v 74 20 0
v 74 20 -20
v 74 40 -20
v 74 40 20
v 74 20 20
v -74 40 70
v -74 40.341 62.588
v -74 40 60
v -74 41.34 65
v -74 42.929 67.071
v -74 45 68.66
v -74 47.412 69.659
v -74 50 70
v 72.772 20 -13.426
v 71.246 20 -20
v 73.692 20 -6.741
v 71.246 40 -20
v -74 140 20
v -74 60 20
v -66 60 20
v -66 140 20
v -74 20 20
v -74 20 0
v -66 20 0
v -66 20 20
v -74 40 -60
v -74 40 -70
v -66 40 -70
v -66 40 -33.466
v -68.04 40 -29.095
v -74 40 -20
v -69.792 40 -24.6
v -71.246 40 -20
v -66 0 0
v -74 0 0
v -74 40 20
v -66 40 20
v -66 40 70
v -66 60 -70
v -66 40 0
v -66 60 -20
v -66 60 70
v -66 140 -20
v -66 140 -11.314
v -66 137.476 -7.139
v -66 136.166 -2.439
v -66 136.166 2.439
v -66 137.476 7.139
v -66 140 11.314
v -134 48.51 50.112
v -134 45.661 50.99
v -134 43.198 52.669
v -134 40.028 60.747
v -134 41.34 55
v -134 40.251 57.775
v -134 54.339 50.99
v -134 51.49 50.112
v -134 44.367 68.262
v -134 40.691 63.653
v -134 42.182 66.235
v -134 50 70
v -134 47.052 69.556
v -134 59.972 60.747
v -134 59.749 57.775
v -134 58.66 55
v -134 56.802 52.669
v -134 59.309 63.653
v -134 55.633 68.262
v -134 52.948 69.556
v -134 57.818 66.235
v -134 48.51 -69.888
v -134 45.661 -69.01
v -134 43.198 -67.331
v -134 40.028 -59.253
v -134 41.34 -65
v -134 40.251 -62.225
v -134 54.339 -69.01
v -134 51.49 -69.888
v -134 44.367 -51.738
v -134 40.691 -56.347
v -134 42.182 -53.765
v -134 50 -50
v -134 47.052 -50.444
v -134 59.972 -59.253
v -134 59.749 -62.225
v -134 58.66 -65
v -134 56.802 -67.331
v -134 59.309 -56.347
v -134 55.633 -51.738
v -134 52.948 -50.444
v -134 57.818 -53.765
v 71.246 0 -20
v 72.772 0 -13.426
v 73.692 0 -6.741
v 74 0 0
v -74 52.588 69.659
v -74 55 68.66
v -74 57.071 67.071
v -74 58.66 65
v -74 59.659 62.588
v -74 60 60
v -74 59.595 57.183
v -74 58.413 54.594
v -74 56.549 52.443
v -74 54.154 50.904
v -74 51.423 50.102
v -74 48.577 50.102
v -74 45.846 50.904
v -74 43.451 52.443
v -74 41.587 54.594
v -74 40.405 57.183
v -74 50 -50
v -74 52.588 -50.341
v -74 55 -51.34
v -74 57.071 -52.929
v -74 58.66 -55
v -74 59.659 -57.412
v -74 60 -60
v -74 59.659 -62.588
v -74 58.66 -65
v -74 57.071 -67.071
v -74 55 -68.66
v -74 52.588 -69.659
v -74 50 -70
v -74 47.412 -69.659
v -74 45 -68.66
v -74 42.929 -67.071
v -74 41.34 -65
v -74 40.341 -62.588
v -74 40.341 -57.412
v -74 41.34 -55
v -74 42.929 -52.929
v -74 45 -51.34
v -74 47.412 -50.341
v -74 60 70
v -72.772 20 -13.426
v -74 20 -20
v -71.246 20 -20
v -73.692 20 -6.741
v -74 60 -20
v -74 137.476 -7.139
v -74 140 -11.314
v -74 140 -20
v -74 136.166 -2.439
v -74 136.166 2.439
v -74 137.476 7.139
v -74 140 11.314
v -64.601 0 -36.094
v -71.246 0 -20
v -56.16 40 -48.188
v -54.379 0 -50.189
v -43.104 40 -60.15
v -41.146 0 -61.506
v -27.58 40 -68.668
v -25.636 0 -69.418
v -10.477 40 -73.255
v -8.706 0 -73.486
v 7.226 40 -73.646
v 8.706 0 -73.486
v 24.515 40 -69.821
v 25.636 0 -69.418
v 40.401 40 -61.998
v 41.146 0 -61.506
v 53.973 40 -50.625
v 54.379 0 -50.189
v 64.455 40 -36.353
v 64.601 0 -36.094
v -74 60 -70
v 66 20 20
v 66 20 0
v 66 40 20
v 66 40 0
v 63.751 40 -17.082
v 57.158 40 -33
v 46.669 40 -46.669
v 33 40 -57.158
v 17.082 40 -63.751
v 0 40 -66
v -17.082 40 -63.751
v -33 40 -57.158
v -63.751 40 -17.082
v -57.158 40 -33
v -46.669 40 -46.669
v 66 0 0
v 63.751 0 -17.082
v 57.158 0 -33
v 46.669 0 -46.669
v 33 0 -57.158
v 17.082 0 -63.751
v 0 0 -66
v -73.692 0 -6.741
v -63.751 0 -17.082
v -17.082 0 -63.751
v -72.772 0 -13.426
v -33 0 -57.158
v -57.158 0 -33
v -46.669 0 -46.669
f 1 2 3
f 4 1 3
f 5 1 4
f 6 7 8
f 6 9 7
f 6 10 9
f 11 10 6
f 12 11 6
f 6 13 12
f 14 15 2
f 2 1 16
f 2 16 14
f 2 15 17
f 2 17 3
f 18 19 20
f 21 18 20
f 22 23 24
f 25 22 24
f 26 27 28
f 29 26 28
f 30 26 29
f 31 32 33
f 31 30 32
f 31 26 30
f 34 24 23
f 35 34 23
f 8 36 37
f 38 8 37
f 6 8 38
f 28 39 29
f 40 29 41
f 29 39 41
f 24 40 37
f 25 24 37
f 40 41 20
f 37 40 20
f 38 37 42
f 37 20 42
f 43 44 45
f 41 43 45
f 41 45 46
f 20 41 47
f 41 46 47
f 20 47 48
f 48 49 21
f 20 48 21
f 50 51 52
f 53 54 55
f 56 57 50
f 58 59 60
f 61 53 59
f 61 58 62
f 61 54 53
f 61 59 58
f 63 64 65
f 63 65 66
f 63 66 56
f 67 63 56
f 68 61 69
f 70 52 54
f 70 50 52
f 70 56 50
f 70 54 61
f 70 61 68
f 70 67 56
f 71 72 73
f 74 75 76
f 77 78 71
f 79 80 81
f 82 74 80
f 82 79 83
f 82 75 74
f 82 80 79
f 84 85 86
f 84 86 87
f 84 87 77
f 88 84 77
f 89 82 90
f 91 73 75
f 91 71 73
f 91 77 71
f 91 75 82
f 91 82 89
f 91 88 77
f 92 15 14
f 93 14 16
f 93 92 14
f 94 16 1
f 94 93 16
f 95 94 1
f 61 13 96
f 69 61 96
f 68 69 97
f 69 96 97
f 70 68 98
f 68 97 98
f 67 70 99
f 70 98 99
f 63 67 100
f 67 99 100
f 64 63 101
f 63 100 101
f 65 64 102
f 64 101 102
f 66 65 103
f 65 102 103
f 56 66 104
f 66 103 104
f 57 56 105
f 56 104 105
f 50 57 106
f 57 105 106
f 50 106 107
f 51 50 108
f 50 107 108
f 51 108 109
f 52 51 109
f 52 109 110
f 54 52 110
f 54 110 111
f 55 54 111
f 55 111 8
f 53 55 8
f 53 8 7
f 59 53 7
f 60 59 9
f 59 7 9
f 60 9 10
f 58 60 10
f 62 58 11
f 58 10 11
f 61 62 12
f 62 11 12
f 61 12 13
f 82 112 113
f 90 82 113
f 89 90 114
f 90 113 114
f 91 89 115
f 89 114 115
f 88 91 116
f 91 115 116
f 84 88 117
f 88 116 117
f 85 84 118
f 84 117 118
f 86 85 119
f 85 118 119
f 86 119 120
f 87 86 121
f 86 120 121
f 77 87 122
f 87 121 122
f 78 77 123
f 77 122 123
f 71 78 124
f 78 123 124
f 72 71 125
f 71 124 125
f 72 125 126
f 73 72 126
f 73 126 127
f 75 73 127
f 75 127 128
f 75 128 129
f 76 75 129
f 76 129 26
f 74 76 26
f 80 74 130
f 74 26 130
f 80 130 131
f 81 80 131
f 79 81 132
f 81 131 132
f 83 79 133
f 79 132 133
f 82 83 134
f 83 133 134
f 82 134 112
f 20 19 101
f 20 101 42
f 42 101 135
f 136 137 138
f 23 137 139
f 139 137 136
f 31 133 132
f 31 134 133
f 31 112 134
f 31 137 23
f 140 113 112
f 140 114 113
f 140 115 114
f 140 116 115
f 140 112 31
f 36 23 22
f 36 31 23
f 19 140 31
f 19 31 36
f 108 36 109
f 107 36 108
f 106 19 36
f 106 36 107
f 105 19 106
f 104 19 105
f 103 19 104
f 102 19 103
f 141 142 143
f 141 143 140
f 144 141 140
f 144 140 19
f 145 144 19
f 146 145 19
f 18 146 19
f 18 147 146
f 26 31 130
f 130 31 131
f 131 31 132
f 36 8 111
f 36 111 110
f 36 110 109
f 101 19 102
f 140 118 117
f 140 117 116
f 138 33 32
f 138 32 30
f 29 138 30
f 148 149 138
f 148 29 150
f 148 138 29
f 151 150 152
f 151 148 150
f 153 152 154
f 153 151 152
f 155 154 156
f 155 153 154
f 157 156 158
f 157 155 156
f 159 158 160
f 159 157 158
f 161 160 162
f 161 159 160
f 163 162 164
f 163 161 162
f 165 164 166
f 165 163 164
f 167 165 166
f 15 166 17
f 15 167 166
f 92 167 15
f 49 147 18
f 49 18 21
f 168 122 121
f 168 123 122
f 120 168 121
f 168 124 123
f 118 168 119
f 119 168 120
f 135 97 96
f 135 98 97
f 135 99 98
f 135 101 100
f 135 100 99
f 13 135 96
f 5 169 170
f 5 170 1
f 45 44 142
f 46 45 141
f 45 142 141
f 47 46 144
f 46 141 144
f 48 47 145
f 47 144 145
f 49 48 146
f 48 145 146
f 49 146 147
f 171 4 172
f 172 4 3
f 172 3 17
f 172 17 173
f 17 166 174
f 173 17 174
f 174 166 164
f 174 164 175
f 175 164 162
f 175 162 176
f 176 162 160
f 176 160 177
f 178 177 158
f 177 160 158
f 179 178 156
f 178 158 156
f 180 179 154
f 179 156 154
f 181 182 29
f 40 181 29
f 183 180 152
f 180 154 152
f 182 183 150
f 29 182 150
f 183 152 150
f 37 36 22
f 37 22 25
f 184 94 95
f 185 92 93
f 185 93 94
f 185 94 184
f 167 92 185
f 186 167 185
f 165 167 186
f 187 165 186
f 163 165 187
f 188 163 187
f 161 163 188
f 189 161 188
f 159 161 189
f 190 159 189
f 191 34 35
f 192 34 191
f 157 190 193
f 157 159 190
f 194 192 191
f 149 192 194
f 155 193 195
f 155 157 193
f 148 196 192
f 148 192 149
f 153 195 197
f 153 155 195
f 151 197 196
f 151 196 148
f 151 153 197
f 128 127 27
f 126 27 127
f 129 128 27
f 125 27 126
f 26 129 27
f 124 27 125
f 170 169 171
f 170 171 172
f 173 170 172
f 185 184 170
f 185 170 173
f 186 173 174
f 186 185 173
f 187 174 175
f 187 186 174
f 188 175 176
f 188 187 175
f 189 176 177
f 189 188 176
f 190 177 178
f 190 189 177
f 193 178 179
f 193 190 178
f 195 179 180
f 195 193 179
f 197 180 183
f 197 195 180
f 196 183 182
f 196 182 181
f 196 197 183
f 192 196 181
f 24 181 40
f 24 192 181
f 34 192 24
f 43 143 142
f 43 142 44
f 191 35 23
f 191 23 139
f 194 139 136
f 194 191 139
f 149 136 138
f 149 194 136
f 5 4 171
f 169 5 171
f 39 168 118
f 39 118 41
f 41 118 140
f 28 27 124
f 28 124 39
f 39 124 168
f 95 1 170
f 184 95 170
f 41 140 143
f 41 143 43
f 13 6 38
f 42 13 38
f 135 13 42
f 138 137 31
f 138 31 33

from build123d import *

# Parameters (mm, degrees)
EXTRUDE_1_DEPTH     = 40
SKETCH_2_W          = 8
SKETCH_2_H          = 40
EXTRUDE_2_DEPTH     = 100
SKETCH_3_R          = 18
CUT_EXTRUDE_1_DEPTH = 149
SKETCH_5_W          = 87.00766185
SKETCH_5_H          = 115.01495327
CUT_EXTRUDE_2_DEPTH = 10
SKETCH_6_R          = 85.063361003
CUT_EXTRUDE_3_DEPTH = 20
SKETCH_7_W          = 140
SKETCH_7_H          = 20
EXTRUDE_3_DEPTH     = 8
SKETCH_9_R          = 10
EXTRUDE_4_DEPTH     = 60


with BuildPart() as part:
    # 草图1 → 凸台-拉伸1 (new body)
    with BuildSketch(Plane(origin=(0, 0, 0), x_dir=(1, 0, 0), z_dir=(0, 1, 0))):
        with BuildLine():
            Line((-74, 20), (-71.246052522, 20))
            ThreePointArc((-71.246052522, 20), (0, 74), (71.246052522, 20))
            Line((71.246052522, 20), (74, 20))
            Line((74, 20), (74, -20))
            Line((74, -20), (66, -20))
            Line((66, -20), (66, 0))
            ThreePointArc((66, 0), (0, 66), (-66, 0))
            Line((-66, 0), (-66, -20))
            Line((-66, -20), (-74, -20))
            Line((-74, -20), (-74, 20))
        make_face()
    extrude(amount=EXTRUDE_1_DEPTH)

    # 草图2 → 凸台-拉伸2 (add)
    with BuildSketch(Plane(origin=(0, 40, 0), x_dir=(1, 0, 0), z_dir=(0, 1, 0))):
        with Locations((-70, 0)):
            Rectangle(SKETCH_2_W, SKETCH_2_H)
        with Locations((70, 0)):
            Rectangle(SKETCH_2_W, SKETCH_2_H)
    extrude(amount=EXTRUDE_2_DEPTH)

    # 草图3 → 切除-拉伸1 (cut, through all)
    with BuildSketch(Plane.ZY.offset(74)):
        with Locations((0, 154)):
            Circle(SKETCH_3_R)
    extrude(amount=-CUT_EXTRUDE_1_DEPTH, mode=Mode.SUBTRACT)

    # 草图5 → 切除-拉伸2 (cut)
    with BuildSketch(Plane(origin=(74, 0, 0), x_dir=(0, 0, -1), z_dir=(1, 0, 0))):
        with Locations((-23.503830925, 97.507476635)):
            Rectangle(SKETCH_5_W, SKETCH_5_H)
    extrude(amount=-CUT_EXTRUDE_2_DEPTH, mode=Mode.SUBTRACT)

    # 草图6 → 切除-拉伸3 (cut)
    with BuildSketch(Plane.XZ):
        Circle(SKETCH_6_R)
        with BuildLine():
            Line((-71.246052522, 20), (-66, 20))
            Line((-66, 20), (-66, 0))
            Line((-66, 0), (-74, 0))
            ThreePointArc((-74, 0), (0, -74), (74, 0))
            Line((74, 0), (66, 0))
            Line((66, 0), (66, 20))
            Line((66, 20), (71.246052522, 20))
            ThreePointArc((71.246052522, 20), (0, 74), (-71.246052522, 20))
        make_face(mode=Mode.SUBTRACT)
    extrude(amount=-CUT_EXTRUDE_3_DEPTH, mode=Mode.SUBTRACT)

    # 草图7 → 凸台-拉伸3 (add)
    with BuildSketch(Plane.ZY.offset(74)):
        with Locations((0, 50)):
            Rectangle(SKETCH_7_W, SKETCH_7_H)
    extrude(amount=-EXTRUDE_3_DEPTH)

    # 草图9 → 凸台-拉伸4 (add)
    with BuildSketch(Plane.ZY.offset(74)):
        with Locations((-60, 50)):
            Circle(SKETCH_9_R)
        with Locations((60, 50)):
            Circle(SKETCH_9_R)
    extrude(amount=EXTRUDE_4_DEPTH)


solid = part.part
